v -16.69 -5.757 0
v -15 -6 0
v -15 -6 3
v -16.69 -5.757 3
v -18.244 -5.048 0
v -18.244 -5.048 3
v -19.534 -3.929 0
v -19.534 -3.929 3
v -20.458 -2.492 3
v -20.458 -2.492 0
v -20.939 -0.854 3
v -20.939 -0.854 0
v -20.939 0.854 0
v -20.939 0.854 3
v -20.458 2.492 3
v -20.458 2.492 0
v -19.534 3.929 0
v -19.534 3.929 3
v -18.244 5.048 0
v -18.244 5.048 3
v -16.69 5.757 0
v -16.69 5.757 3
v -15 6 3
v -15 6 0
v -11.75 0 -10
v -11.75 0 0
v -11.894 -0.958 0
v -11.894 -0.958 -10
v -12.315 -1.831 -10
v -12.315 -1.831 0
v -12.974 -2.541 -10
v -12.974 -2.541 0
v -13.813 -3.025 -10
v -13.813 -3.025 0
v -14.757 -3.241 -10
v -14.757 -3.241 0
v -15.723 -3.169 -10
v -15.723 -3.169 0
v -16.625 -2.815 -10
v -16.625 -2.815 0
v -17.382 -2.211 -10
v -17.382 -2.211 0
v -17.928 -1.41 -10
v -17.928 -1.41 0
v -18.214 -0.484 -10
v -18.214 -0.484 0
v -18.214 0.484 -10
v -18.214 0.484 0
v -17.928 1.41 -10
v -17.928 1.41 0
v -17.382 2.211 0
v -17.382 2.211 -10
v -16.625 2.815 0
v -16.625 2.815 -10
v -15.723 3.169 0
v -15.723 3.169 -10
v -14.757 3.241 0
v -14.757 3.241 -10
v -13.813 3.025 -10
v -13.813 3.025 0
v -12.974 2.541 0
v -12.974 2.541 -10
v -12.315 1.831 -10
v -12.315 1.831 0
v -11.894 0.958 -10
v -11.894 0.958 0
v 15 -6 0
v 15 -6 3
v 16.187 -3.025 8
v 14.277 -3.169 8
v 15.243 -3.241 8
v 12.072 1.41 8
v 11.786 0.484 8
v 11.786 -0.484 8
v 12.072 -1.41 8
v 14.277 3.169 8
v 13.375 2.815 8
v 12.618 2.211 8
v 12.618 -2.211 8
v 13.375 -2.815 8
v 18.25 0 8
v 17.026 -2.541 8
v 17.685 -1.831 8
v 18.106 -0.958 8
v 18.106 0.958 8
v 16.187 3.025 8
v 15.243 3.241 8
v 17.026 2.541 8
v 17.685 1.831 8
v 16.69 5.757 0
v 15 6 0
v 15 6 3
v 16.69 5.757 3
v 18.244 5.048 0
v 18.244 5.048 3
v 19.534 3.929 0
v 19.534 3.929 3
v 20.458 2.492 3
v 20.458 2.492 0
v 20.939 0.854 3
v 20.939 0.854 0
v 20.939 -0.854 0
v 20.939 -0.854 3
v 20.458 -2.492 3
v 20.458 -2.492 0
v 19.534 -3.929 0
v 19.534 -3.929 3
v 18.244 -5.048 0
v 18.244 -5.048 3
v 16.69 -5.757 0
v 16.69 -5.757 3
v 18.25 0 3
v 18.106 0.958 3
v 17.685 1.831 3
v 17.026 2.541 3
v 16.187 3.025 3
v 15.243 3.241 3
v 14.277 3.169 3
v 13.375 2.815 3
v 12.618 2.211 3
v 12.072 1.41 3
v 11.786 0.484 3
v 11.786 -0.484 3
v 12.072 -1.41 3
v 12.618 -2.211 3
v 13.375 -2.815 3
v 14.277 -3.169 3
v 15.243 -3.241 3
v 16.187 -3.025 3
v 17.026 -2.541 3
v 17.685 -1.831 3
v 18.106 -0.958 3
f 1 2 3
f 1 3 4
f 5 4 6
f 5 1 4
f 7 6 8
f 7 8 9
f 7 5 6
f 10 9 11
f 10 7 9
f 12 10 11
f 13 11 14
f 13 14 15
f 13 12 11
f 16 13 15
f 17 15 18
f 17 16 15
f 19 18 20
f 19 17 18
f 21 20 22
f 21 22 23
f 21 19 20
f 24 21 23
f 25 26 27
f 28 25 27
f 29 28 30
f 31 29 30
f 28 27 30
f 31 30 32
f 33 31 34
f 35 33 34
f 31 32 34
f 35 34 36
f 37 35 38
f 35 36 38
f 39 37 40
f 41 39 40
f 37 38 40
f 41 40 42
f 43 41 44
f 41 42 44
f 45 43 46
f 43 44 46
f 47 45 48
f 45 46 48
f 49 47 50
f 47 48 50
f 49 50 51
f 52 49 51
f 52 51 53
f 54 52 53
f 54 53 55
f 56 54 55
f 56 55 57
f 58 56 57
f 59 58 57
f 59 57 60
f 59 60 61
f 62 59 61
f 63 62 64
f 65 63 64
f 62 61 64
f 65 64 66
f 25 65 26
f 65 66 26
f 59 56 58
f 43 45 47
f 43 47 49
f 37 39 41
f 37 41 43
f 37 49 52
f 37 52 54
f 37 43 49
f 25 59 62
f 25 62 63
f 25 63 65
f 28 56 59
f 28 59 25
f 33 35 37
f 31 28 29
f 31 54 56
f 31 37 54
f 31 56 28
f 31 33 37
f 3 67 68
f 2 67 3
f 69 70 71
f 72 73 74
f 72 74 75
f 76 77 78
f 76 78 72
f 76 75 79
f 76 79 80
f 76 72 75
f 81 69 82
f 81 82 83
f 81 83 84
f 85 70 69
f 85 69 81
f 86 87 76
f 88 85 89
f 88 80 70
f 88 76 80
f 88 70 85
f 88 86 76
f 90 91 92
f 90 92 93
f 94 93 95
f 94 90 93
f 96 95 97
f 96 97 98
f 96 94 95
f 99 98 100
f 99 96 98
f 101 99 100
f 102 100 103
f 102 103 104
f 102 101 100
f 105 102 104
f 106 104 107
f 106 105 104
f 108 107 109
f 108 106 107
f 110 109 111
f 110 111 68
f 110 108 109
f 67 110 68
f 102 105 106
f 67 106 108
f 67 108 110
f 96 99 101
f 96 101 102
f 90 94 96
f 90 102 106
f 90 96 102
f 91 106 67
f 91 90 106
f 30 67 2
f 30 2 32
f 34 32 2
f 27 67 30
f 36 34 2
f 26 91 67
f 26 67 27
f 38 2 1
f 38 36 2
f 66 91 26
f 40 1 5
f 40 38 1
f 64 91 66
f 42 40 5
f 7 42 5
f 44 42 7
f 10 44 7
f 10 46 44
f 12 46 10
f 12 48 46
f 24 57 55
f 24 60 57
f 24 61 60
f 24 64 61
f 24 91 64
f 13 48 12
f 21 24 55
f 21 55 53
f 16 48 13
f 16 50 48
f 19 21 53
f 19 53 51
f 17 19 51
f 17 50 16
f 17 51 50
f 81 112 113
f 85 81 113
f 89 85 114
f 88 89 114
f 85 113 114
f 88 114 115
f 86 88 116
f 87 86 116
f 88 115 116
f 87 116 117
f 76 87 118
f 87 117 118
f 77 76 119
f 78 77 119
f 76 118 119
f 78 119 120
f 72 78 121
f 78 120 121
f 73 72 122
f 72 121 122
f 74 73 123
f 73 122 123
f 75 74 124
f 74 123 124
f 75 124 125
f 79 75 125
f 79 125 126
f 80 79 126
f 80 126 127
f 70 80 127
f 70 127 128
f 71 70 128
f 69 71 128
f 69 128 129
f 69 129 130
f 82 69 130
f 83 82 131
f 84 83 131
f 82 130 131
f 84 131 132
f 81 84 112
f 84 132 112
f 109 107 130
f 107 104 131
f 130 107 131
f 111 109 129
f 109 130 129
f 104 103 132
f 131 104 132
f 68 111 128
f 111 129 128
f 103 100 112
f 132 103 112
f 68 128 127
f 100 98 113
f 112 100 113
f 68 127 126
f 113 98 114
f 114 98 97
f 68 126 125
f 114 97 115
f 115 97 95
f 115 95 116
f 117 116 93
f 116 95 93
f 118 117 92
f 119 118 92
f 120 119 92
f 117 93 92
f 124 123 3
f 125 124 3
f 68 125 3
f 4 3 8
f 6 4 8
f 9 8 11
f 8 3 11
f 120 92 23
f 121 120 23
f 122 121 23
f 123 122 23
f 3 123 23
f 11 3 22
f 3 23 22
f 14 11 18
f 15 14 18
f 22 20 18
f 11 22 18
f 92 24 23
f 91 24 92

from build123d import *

# Parameters (mm, degrees)
Y_KSEKLIK_EKSTR_ZYON1_DEPTH = 3
IZIM2_R                     = 3.25
Y_KSEKLIK_EKSTR_ZYON2_DEPTH = 5
IZIM3_R                     = 3.25
Y_KSEKLIK_EKSTR_ZYON3_DEPTH = 10


with BuildPart() as part:
    # Çizim1 → Yükseklik-Ekstrüzyon1 (new body)
    with BuildSketch(Plane.XY):
        with BuildLine():
            Line((-15, 6), (15, 6))
            ThreePointArc((15, 6), (21, 0), (15, -6))
            Line((15, -6), (-15, -6))
            ThreePointArc((-15, -6), (-21, 0), (-15, 6))
        make_face()
    extrude(amount=Y_KSEKLIK_EKSTR_ZYON1_DEPTH)

    # Çizim2 → Yükseklik-Ekstrüzyon2 (add)
    with BuildSketch(Plane.XY.offset(3)):
        with Locations((15, 0)):
            Circle(IZIM2_R)
    extrude(amount=Y_KSEKLIK_EKSTR_ZYON2_DEPTH)

    # Çizim3 → Yükseklik-Ekstrüzyon3 (add)
    with BuildSketch(Plane(origin=(0, 0, 0), x_dir=(-1, 0, 0), z_dir=(0, 0, -1))):
        with Locations(Location((15, 0, 0), (0, 0, 180))):
            Circle(IZIM3_R)
    extrude(amount=Y_KSEKLIK_EKSTR_ZYON3_DEPTH)


solid = part.part
